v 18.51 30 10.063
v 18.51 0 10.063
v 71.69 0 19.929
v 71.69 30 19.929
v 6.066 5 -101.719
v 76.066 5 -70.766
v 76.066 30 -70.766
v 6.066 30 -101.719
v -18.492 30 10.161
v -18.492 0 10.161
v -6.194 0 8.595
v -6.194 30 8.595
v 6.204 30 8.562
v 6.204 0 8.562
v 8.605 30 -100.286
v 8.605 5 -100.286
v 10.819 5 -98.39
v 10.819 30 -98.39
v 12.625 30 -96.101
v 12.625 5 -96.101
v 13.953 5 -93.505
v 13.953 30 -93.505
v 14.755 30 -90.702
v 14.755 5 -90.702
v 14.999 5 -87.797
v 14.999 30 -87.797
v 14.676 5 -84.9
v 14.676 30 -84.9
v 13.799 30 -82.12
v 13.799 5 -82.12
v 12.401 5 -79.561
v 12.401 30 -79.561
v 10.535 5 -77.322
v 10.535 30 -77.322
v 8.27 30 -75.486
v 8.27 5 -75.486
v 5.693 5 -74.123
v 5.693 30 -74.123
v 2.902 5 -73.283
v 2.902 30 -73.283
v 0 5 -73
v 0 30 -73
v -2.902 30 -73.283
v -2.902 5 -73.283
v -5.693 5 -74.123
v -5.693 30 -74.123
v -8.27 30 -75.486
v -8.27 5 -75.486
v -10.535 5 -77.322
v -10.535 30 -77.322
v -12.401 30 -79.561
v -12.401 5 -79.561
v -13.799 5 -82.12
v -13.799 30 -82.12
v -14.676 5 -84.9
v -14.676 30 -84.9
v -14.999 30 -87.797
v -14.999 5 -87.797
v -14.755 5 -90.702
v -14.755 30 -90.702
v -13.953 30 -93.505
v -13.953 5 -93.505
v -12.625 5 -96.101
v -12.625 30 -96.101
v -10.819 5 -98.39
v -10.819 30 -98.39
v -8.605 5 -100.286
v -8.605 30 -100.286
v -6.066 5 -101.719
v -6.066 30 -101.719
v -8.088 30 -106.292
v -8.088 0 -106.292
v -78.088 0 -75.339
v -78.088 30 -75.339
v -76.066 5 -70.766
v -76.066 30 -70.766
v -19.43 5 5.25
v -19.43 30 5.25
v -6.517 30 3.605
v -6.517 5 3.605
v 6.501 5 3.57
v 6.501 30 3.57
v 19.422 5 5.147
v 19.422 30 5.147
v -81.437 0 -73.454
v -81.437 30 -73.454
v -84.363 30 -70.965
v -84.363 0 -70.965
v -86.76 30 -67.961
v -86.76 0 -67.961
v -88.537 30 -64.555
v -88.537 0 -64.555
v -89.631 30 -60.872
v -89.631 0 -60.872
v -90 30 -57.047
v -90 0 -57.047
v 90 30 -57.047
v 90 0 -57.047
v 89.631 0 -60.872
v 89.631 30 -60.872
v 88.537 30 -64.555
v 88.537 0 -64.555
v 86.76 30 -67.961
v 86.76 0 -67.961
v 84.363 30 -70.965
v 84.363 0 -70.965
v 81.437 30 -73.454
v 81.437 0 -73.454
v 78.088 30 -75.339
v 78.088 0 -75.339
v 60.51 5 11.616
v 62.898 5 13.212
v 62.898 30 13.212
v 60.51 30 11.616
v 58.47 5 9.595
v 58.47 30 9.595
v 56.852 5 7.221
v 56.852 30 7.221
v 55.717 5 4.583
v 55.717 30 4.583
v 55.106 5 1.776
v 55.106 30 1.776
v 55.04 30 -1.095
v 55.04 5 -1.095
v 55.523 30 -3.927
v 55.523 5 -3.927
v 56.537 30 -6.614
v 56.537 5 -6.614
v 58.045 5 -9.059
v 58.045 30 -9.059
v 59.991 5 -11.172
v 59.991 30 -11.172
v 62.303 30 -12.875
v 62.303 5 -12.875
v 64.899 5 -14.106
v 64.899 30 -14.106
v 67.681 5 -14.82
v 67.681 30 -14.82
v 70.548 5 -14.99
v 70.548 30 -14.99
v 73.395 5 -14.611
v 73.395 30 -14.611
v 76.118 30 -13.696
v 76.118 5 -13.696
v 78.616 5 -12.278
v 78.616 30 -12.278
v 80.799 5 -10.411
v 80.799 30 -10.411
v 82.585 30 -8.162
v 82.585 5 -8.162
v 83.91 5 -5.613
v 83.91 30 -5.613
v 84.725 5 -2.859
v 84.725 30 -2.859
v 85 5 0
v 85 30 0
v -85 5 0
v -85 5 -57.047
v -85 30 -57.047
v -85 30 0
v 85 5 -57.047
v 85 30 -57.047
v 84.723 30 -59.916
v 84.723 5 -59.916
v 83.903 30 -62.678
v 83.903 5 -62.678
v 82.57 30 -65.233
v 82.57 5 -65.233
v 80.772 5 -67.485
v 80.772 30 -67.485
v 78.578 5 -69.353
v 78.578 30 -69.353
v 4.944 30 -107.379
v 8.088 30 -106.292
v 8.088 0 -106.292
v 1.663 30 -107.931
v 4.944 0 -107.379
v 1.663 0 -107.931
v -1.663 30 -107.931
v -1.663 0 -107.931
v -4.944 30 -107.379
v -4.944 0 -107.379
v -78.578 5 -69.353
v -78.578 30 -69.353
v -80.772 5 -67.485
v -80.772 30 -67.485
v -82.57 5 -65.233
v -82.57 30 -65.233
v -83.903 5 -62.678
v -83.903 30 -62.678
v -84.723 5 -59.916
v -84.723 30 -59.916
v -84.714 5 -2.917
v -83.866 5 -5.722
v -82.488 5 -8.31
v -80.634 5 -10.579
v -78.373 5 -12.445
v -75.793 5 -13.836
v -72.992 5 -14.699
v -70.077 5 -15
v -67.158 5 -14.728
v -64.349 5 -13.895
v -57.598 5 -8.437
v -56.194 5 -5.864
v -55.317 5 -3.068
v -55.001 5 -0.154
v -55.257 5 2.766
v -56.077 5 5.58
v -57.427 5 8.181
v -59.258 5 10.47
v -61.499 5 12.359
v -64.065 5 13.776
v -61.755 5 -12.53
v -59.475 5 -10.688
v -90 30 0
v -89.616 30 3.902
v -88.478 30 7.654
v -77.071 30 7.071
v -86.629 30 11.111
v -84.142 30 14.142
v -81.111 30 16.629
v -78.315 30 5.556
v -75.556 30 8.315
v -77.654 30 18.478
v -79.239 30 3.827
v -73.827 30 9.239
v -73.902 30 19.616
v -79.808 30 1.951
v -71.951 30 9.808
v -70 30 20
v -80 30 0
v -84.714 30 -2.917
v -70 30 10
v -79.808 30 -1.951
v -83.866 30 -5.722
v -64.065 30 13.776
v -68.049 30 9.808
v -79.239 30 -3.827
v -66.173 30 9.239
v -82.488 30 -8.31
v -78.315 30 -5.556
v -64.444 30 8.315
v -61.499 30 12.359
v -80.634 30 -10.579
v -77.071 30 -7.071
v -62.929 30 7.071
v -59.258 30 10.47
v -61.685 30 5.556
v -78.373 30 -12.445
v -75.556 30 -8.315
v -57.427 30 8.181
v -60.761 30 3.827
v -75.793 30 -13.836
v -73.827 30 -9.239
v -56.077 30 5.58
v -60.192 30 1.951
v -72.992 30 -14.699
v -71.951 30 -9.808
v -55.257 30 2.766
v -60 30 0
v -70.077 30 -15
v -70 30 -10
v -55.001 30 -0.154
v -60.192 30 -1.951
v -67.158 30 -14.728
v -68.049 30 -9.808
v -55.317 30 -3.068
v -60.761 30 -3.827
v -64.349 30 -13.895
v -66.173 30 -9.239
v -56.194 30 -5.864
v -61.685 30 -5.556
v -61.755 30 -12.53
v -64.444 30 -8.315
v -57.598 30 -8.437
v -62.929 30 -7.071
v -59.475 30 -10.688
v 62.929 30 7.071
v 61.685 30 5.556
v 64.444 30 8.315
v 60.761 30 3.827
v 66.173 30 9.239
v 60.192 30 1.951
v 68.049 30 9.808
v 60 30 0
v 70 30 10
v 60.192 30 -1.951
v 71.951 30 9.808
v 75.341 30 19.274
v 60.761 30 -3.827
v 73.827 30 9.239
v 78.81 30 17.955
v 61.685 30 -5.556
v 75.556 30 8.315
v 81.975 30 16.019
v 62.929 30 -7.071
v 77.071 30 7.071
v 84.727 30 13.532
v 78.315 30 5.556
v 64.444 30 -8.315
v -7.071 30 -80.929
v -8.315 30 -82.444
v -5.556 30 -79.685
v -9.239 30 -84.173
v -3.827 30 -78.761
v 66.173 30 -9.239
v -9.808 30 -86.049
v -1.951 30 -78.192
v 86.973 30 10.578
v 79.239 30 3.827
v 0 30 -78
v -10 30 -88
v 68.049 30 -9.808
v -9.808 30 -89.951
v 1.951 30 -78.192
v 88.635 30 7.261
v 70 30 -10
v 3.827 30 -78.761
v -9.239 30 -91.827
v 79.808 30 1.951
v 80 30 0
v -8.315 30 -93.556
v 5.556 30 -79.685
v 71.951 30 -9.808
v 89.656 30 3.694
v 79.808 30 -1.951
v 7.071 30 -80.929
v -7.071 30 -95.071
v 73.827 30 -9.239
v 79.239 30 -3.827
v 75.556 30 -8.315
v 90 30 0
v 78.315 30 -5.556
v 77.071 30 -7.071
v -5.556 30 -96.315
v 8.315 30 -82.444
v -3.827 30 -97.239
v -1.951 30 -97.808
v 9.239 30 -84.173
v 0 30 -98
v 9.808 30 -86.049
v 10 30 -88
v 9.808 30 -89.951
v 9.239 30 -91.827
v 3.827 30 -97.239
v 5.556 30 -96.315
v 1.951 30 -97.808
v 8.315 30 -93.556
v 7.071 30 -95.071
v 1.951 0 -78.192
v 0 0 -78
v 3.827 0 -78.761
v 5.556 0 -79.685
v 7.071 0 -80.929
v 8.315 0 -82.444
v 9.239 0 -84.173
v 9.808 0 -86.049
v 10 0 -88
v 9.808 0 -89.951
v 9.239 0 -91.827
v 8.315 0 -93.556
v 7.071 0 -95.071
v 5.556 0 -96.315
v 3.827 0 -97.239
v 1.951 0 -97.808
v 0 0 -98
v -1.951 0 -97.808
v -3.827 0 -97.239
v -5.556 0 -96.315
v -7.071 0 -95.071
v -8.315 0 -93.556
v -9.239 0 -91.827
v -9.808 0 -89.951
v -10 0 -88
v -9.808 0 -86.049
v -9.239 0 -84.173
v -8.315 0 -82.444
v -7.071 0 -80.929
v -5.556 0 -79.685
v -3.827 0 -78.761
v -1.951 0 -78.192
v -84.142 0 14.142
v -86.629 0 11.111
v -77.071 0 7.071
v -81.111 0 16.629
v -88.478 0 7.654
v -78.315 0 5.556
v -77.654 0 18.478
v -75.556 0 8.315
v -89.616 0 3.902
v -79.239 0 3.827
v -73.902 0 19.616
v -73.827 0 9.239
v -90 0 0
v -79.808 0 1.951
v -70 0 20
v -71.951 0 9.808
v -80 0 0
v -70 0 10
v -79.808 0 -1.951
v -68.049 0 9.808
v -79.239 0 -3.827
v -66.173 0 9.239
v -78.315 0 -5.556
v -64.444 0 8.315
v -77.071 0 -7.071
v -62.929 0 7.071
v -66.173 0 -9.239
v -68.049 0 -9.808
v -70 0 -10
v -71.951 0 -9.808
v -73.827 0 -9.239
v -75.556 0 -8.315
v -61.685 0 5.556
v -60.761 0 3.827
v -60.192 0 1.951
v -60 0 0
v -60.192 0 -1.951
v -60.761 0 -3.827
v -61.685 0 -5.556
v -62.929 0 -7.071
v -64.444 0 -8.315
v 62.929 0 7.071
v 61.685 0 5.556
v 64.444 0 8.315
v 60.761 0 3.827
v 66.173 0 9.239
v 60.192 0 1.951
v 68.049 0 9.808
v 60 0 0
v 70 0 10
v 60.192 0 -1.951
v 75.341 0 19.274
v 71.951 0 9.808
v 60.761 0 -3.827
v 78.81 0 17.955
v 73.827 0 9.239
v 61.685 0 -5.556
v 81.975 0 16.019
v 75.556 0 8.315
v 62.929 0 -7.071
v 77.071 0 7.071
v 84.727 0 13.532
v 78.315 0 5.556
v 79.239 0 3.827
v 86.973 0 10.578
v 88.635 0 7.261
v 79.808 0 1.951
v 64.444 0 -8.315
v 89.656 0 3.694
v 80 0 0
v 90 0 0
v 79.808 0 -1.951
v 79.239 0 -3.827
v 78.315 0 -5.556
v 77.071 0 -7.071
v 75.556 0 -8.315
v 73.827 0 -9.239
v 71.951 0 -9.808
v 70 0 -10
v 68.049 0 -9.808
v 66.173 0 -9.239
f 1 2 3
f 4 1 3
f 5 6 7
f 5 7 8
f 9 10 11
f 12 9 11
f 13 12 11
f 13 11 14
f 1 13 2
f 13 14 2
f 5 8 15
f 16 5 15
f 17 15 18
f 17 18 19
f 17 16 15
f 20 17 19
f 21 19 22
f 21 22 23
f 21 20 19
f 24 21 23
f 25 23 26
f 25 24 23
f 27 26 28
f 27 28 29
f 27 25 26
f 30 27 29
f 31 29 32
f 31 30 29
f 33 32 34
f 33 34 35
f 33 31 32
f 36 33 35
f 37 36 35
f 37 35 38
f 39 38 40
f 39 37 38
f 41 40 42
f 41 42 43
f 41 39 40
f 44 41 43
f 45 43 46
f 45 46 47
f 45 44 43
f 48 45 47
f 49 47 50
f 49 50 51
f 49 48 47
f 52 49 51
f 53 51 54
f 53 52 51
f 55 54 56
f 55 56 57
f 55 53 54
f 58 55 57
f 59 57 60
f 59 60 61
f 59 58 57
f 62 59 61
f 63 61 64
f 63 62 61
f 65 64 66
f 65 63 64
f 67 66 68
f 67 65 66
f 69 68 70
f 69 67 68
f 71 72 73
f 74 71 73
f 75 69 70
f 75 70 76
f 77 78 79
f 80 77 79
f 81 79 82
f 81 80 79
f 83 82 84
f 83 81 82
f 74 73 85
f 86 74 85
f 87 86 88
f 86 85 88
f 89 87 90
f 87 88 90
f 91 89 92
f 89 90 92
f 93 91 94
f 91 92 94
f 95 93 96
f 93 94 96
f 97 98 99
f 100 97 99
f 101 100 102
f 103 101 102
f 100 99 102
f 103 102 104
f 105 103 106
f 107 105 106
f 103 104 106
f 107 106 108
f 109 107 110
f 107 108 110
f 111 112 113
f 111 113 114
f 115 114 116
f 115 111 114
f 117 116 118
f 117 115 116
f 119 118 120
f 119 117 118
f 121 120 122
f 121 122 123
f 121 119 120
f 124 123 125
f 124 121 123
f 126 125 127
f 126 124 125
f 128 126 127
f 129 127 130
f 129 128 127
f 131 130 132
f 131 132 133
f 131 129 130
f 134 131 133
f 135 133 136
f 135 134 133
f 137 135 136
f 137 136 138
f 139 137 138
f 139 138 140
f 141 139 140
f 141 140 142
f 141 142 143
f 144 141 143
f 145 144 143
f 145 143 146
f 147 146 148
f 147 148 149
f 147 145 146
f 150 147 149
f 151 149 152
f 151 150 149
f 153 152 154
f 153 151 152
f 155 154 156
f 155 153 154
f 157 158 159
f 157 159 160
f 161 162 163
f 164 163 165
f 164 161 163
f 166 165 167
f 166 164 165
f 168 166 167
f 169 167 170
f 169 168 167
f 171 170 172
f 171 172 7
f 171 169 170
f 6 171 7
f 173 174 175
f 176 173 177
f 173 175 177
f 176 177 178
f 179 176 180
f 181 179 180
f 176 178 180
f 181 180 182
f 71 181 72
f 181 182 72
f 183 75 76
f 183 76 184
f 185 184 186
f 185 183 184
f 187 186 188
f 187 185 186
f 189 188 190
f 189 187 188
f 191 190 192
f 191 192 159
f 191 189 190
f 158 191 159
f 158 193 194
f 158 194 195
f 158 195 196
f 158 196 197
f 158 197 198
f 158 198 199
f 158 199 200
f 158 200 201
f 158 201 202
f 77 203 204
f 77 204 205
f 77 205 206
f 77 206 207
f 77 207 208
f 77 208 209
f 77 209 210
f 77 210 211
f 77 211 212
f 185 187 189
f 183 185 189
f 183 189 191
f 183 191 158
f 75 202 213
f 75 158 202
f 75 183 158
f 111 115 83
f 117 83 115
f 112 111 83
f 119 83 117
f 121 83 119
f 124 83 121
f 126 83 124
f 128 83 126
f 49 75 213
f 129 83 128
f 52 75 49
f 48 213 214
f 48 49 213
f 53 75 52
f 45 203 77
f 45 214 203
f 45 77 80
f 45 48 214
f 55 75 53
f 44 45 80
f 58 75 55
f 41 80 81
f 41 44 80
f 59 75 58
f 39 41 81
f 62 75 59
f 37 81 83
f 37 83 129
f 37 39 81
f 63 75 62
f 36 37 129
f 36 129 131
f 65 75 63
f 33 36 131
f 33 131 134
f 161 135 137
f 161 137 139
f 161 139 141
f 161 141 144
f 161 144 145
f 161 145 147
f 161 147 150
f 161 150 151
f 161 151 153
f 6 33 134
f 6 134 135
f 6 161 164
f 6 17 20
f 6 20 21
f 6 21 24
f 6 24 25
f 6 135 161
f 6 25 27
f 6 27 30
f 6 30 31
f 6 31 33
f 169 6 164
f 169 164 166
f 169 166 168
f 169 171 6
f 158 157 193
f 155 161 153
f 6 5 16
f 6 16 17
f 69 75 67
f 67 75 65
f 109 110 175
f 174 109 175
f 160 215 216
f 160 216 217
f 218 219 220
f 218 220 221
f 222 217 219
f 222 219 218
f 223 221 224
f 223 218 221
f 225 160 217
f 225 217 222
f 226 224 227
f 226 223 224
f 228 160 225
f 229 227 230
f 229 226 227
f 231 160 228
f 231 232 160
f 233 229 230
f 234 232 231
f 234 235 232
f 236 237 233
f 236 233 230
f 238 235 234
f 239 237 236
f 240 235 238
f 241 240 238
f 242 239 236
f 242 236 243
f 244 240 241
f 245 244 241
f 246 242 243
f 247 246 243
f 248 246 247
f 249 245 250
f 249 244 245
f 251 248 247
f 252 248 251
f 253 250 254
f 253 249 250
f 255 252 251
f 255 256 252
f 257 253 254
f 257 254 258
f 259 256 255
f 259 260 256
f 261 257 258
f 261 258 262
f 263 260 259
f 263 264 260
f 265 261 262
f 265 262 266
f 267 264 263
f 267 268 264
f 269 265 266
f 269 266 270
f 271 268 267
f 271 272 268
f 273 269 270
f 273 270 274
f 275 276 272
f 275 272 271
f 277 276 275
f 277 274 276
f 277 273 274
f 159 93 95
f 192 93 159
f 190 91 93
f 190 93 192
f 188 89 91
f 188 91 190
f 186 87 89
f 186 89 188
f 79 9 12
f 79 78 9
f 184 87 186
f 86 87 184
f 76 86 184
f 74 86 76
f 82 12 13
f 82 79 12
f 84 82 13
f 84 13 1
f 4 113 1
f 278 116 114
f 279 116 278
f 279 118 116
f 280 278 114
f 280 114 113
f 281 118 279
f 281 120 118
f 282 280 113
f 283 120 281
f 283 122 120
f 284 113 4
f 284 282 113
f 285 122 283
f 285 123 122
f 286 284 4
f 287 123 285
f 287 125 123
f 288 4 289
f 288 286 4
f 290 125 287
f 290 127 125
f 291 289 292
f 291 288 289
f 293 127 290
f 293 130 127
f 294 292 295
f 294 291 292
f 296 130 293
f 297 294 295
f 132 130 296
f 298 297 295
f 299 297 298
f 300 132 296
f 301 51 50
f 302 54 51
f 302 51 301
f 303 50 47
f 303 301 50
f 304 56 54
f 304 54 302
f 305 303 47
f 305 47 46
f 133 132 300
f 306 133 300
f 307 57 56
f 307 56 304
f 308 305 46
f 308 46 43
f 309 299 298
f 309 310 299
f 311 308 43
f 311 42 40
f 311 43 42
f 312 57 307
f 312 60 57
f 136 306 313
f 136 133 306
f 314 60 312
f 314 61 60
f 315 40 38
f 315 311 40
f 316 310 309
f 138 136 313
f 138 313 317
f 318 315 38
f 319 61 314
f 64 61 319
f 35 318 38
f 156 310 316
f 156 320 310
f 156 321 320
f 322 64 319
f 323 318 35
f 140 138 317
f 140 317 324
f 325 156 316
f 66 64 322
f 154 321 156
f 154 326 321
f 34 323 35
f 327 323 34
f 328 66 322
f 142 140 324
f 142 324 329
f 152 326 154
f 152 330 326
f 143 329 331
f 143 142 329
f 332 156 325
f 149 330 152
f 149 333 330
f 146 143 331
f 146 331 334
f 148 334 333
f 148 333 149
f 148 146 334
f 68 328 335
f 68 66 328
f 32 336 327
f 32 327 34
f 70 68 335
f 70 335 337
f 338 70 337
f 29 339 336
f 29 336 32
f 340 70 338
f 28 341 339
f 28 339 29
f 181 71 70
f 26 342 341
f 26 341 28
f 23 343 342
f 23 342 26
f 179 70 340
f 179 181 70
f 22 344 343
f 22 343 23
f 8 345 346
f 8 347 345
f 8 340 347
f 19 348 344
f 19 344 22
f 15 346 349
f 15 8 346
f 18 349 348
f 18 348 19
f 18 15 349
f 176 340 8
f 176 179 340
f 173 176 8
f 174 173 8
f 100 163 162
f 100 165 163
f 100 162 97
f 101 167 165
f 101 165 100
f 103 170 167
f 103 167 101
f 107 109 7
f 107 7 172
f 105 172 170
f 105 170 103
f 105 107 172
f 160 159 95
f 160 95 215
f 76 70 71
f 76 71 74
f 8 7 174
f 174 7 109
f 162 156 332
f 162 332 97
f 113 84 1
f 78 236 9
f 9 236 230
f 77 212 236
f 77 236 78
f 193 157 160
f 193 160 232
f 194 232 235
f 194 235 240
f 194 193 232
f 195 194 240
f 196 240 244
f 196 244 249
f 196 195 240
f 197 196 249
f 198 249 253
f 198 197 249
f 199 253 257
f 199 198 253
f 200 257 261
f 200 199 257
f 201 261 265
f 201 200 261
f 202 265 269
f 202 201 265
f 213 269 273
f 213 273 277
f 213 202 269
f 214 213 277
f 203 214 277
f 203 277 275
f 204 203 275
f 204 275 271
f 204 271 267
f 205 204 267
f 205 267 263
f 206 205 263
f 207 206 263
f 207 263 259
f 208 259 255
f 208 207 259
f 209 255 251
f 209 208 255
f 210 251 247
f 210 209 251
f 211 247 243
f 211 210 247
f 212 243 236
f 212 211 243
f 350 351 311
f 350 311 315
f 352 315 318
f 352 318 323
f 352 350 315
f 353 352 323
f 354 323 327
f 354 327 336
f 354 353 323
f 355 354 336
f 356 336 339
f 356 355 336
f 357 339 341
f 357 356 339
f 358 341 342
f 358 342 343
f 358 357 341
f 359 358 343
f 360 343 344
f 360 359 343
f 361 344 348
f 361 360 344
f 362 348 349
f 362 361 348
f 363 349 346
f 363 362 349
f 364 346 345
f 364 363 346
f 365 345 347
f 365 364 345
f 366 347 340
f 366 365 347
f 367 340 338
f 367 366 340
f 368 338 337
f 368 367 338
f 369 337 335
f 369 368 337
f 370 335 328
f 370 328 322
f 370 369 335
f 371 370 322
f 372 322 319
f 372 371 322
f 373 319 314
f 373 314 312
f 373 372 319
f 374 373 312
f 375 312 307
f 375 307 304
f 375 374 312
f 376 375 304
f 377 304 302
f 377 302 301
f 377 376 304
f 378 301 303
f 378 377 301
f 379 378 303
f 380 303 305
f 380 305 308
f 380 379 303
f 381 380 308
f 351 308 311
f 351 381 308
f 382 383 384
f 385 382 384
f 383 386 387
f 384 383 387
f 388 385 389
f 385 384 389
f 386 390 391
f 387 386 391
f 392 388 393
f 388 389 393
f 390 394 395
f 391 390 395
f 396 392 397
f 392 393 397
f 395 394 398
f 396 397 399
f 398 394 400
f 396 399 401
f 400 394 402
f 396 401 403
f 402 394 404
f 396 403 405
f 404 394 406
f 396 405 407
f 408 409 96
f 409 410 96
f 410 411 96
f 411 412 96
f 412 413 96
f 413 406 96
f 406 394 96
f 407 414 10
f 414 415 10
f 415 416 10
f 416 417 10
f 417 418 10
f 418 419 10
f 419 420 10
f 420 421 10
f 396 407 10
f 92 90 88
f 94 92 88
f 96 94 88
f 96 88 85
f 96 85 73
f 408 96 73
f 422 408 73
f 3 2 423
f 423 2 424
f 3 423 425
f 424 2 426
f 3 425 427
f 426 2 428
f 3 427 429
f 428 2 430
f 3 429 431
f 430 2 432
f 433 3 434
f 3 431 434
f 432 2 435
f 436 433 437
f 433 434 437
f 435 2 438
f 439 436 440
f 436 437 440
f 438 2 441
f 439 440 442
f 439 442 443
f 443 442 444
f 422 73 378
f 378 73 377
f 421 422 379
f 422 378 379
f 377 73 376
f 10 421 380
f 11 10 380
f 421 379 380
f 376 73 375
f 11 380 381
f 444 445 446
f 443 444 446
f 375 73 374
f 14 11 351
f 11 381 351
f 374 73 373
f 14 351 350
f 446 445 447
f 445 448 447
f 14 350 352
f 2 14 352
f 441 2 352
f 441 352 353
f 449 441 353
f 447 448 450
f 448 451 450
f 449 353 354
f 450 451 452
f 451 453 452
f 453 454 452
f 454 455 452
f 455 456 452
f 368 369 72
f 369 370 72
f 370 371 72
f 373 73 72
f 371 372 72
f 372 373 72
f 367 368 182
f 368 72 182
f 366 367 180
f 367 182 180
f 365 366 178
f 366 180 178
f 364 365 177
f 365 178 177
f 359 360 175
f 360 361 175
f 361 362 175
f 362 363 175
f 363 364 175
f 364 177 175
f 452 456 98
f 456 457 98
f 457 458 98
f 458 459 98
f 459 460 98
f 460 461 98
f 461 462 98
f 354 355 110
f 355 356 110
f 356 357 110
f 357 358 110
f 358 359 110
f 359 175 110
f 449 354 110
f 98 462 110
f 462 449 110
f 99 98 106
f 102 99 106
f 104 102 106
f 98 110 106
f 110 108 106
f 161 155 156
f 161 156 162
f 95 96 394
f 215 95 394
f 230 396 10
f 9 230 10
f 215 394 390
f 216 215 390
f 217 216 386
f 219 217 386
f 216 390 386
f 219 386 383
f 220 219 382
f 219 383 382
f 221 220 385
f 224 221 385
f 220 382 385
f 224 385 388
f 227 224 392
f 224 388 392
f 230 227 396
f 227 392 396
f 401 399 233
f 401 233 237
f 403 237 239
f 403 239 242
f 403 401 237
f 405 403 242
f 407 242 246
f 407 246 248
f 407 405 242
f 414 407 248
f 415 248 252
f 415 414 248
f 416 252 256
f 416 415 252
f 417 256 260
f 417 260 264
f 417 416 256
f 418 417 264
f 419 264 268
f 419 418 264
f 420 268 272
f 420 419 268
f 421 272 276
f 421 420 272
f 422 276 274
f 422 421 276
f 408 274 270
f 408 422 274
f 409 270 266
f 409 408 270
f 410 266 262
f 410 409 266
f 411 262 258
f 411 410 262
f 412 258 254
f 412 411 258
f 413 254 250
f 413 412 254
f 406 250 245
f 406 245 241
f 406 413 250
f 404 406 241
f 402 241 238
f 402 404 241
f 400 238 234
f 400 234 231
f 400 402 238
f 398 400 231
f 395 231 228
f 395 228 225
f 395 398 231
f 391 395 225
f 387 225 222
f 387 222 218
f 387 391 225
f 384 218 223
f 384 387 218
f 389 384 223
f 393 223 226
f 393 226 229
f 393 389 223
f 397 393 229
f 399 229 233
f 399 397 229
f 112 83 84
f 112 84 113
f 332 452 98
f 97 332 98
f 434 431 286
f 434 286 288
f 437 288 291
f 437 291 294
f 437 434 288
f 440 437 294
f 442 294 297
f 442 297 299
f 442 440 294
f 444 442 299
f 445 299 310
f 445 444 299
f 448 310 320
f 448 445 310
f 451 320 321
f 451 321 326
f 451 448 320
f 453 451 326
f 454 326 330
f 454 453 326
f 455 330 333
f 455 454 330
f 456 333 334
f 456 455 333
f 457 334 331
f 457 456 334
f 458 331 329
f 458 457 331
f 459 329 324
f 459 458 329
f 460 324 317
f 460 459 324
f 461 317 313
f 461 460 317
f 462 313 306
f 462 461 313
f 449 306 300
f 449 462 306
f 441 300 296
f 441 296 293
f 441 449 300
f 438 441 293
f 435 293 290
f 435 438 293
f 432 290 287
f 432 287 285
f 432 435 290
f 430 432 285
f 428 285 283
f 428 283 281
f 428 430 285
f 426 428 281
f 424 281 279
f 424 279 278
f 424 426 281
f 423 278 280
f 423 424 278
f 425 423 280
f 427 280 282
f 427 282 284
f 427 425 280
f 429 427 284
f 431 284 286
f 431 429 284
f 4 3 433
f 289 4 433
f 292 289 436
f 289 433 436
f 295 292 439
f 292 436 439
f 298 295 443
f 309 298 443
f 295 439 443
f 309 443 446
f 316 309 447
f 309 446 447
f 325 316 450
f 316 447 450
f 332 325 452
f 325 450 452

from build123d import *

# Parameters (mm, degrees)
SKETCH1_R           = 10
BOSS_EXTRUDE1_DEPTH = 30
SHELL3_START        = 5
SHELL3_DEPTH        = 25


# Read off the part's stored shape, not the designer's step: Shell3
with BuildPart() as part:
    # Sketch1 → Boss-Extrude1 (new body)
    with BuildSketch(Plane(origin=(0, 0, 0), x_dir=(1, 0, 0), z_dir=(0, 1, 0))):
        with BuildLine():
            Line((90, 0), (90, 57.047137228))
            ThreePointArc((90, 57.047137228), (86.75954181, 67.961245451), (78.088224169, 75.338682537))
            Line((78.088224169, 75.338682537), (8.088224169, 106.291545309))
            ThreePointArc((8.088224169, 106.291545309), (0, 108), (-8.088224169, 106.291545309))
            Line((-8.088224169, 106.291545309), (-78.088224169, 75.338682537))
            ThreePointArc((-78.088224169, 75.338682537), (-86.75954181, 67.961245451), (-90, 57.047137228))
            Line((-90, 57.047137228), (-90, 0))
            ThreePointArc((-90, 0), (-84.142135624, -14.142135624), (-70, -20))
            Line((-70, -20), (-18.49195659, -10.161261295))
            ThreePointArc((-18.49195659, -10.161261295), (0.004664589, -8.385754022), (18.510453887, -10.063008789))
            Line((18.510453887, -10.063008789), (71.68950902, -19.928511216))
            ThreePointArc((71.68950902, -19.928511216), (84.727358561, -13.531626281), (90, 0))
        make_face()
        with Locations(Location((-70, 0, 0), (0, 0, 270))):
            Circle(SKETCH1_R, mode=Mode.SUBTRACT)
        with Locations(Location((70, 0, 0), (0, 0, 270))):
            Circle(SKETCH1_R, mode=Mode.SUBTRACT)
        with Locations(Location((0, 88, 0), (0, 0, 270))):
            Circle(SKETCH1_R, mode=Mode.SUBTRACT)
    extrude(amount=BOSS_EXTRUDE1_DEPTH)

    # Shell3 outline → Shell3 (cut)
    with BuildSketch(Plane(origin=(0, 0, 0), x_dir=(1, 0, 0), z_dir=(0, 1, 0)).offset(SHELL3_START)):
        with BuildLine():
            Line((-85, 57.047137228), (-85, 0))
            ThreePointArc((-85, 0), (-61.754503332, 12.530434338), (-64.065095374, -13.775953944))
            Line((-64.065095374, -13.775953944), (-19.430064103, -5.250054285))
            ThreePointArc((-19.430064103, -5.250054285), (-0.008611865, -3.385771649), (19.422466898, -5.146889154))
            Line((19.422466898, -5.146889154), (62.898194489, -13.212280594))
            ThreePointArc((62.898194489, -13.212280594), (62.303477495, 12.874919081), (85, 0))
            Line((85, 0), (85, 57.047137228))
            ThreePointArc((85, 57.047137228), (82.569656358, 65.232718395), (76.066168127, 70.765796209))
            Line((76.066168127, 70.765796209), (6.066168127, 101.718658982))
            ThreePointArc((6.066168127, 101.718658982), (0, 73), (-6.066168127, 101.718658982))
            Line((-6.066168127, 101.718658982), (-76.066168127, 70.765796209))
            ThreePointArc((-76.066168127, 70.765796209), (-82.569656358, 65.232718395), (-85, 57.047137228))
        make_face()
    extrude(amount=SHELL3_DEPTH, mode=Mode.SUBTRACT)


solid = part.part
